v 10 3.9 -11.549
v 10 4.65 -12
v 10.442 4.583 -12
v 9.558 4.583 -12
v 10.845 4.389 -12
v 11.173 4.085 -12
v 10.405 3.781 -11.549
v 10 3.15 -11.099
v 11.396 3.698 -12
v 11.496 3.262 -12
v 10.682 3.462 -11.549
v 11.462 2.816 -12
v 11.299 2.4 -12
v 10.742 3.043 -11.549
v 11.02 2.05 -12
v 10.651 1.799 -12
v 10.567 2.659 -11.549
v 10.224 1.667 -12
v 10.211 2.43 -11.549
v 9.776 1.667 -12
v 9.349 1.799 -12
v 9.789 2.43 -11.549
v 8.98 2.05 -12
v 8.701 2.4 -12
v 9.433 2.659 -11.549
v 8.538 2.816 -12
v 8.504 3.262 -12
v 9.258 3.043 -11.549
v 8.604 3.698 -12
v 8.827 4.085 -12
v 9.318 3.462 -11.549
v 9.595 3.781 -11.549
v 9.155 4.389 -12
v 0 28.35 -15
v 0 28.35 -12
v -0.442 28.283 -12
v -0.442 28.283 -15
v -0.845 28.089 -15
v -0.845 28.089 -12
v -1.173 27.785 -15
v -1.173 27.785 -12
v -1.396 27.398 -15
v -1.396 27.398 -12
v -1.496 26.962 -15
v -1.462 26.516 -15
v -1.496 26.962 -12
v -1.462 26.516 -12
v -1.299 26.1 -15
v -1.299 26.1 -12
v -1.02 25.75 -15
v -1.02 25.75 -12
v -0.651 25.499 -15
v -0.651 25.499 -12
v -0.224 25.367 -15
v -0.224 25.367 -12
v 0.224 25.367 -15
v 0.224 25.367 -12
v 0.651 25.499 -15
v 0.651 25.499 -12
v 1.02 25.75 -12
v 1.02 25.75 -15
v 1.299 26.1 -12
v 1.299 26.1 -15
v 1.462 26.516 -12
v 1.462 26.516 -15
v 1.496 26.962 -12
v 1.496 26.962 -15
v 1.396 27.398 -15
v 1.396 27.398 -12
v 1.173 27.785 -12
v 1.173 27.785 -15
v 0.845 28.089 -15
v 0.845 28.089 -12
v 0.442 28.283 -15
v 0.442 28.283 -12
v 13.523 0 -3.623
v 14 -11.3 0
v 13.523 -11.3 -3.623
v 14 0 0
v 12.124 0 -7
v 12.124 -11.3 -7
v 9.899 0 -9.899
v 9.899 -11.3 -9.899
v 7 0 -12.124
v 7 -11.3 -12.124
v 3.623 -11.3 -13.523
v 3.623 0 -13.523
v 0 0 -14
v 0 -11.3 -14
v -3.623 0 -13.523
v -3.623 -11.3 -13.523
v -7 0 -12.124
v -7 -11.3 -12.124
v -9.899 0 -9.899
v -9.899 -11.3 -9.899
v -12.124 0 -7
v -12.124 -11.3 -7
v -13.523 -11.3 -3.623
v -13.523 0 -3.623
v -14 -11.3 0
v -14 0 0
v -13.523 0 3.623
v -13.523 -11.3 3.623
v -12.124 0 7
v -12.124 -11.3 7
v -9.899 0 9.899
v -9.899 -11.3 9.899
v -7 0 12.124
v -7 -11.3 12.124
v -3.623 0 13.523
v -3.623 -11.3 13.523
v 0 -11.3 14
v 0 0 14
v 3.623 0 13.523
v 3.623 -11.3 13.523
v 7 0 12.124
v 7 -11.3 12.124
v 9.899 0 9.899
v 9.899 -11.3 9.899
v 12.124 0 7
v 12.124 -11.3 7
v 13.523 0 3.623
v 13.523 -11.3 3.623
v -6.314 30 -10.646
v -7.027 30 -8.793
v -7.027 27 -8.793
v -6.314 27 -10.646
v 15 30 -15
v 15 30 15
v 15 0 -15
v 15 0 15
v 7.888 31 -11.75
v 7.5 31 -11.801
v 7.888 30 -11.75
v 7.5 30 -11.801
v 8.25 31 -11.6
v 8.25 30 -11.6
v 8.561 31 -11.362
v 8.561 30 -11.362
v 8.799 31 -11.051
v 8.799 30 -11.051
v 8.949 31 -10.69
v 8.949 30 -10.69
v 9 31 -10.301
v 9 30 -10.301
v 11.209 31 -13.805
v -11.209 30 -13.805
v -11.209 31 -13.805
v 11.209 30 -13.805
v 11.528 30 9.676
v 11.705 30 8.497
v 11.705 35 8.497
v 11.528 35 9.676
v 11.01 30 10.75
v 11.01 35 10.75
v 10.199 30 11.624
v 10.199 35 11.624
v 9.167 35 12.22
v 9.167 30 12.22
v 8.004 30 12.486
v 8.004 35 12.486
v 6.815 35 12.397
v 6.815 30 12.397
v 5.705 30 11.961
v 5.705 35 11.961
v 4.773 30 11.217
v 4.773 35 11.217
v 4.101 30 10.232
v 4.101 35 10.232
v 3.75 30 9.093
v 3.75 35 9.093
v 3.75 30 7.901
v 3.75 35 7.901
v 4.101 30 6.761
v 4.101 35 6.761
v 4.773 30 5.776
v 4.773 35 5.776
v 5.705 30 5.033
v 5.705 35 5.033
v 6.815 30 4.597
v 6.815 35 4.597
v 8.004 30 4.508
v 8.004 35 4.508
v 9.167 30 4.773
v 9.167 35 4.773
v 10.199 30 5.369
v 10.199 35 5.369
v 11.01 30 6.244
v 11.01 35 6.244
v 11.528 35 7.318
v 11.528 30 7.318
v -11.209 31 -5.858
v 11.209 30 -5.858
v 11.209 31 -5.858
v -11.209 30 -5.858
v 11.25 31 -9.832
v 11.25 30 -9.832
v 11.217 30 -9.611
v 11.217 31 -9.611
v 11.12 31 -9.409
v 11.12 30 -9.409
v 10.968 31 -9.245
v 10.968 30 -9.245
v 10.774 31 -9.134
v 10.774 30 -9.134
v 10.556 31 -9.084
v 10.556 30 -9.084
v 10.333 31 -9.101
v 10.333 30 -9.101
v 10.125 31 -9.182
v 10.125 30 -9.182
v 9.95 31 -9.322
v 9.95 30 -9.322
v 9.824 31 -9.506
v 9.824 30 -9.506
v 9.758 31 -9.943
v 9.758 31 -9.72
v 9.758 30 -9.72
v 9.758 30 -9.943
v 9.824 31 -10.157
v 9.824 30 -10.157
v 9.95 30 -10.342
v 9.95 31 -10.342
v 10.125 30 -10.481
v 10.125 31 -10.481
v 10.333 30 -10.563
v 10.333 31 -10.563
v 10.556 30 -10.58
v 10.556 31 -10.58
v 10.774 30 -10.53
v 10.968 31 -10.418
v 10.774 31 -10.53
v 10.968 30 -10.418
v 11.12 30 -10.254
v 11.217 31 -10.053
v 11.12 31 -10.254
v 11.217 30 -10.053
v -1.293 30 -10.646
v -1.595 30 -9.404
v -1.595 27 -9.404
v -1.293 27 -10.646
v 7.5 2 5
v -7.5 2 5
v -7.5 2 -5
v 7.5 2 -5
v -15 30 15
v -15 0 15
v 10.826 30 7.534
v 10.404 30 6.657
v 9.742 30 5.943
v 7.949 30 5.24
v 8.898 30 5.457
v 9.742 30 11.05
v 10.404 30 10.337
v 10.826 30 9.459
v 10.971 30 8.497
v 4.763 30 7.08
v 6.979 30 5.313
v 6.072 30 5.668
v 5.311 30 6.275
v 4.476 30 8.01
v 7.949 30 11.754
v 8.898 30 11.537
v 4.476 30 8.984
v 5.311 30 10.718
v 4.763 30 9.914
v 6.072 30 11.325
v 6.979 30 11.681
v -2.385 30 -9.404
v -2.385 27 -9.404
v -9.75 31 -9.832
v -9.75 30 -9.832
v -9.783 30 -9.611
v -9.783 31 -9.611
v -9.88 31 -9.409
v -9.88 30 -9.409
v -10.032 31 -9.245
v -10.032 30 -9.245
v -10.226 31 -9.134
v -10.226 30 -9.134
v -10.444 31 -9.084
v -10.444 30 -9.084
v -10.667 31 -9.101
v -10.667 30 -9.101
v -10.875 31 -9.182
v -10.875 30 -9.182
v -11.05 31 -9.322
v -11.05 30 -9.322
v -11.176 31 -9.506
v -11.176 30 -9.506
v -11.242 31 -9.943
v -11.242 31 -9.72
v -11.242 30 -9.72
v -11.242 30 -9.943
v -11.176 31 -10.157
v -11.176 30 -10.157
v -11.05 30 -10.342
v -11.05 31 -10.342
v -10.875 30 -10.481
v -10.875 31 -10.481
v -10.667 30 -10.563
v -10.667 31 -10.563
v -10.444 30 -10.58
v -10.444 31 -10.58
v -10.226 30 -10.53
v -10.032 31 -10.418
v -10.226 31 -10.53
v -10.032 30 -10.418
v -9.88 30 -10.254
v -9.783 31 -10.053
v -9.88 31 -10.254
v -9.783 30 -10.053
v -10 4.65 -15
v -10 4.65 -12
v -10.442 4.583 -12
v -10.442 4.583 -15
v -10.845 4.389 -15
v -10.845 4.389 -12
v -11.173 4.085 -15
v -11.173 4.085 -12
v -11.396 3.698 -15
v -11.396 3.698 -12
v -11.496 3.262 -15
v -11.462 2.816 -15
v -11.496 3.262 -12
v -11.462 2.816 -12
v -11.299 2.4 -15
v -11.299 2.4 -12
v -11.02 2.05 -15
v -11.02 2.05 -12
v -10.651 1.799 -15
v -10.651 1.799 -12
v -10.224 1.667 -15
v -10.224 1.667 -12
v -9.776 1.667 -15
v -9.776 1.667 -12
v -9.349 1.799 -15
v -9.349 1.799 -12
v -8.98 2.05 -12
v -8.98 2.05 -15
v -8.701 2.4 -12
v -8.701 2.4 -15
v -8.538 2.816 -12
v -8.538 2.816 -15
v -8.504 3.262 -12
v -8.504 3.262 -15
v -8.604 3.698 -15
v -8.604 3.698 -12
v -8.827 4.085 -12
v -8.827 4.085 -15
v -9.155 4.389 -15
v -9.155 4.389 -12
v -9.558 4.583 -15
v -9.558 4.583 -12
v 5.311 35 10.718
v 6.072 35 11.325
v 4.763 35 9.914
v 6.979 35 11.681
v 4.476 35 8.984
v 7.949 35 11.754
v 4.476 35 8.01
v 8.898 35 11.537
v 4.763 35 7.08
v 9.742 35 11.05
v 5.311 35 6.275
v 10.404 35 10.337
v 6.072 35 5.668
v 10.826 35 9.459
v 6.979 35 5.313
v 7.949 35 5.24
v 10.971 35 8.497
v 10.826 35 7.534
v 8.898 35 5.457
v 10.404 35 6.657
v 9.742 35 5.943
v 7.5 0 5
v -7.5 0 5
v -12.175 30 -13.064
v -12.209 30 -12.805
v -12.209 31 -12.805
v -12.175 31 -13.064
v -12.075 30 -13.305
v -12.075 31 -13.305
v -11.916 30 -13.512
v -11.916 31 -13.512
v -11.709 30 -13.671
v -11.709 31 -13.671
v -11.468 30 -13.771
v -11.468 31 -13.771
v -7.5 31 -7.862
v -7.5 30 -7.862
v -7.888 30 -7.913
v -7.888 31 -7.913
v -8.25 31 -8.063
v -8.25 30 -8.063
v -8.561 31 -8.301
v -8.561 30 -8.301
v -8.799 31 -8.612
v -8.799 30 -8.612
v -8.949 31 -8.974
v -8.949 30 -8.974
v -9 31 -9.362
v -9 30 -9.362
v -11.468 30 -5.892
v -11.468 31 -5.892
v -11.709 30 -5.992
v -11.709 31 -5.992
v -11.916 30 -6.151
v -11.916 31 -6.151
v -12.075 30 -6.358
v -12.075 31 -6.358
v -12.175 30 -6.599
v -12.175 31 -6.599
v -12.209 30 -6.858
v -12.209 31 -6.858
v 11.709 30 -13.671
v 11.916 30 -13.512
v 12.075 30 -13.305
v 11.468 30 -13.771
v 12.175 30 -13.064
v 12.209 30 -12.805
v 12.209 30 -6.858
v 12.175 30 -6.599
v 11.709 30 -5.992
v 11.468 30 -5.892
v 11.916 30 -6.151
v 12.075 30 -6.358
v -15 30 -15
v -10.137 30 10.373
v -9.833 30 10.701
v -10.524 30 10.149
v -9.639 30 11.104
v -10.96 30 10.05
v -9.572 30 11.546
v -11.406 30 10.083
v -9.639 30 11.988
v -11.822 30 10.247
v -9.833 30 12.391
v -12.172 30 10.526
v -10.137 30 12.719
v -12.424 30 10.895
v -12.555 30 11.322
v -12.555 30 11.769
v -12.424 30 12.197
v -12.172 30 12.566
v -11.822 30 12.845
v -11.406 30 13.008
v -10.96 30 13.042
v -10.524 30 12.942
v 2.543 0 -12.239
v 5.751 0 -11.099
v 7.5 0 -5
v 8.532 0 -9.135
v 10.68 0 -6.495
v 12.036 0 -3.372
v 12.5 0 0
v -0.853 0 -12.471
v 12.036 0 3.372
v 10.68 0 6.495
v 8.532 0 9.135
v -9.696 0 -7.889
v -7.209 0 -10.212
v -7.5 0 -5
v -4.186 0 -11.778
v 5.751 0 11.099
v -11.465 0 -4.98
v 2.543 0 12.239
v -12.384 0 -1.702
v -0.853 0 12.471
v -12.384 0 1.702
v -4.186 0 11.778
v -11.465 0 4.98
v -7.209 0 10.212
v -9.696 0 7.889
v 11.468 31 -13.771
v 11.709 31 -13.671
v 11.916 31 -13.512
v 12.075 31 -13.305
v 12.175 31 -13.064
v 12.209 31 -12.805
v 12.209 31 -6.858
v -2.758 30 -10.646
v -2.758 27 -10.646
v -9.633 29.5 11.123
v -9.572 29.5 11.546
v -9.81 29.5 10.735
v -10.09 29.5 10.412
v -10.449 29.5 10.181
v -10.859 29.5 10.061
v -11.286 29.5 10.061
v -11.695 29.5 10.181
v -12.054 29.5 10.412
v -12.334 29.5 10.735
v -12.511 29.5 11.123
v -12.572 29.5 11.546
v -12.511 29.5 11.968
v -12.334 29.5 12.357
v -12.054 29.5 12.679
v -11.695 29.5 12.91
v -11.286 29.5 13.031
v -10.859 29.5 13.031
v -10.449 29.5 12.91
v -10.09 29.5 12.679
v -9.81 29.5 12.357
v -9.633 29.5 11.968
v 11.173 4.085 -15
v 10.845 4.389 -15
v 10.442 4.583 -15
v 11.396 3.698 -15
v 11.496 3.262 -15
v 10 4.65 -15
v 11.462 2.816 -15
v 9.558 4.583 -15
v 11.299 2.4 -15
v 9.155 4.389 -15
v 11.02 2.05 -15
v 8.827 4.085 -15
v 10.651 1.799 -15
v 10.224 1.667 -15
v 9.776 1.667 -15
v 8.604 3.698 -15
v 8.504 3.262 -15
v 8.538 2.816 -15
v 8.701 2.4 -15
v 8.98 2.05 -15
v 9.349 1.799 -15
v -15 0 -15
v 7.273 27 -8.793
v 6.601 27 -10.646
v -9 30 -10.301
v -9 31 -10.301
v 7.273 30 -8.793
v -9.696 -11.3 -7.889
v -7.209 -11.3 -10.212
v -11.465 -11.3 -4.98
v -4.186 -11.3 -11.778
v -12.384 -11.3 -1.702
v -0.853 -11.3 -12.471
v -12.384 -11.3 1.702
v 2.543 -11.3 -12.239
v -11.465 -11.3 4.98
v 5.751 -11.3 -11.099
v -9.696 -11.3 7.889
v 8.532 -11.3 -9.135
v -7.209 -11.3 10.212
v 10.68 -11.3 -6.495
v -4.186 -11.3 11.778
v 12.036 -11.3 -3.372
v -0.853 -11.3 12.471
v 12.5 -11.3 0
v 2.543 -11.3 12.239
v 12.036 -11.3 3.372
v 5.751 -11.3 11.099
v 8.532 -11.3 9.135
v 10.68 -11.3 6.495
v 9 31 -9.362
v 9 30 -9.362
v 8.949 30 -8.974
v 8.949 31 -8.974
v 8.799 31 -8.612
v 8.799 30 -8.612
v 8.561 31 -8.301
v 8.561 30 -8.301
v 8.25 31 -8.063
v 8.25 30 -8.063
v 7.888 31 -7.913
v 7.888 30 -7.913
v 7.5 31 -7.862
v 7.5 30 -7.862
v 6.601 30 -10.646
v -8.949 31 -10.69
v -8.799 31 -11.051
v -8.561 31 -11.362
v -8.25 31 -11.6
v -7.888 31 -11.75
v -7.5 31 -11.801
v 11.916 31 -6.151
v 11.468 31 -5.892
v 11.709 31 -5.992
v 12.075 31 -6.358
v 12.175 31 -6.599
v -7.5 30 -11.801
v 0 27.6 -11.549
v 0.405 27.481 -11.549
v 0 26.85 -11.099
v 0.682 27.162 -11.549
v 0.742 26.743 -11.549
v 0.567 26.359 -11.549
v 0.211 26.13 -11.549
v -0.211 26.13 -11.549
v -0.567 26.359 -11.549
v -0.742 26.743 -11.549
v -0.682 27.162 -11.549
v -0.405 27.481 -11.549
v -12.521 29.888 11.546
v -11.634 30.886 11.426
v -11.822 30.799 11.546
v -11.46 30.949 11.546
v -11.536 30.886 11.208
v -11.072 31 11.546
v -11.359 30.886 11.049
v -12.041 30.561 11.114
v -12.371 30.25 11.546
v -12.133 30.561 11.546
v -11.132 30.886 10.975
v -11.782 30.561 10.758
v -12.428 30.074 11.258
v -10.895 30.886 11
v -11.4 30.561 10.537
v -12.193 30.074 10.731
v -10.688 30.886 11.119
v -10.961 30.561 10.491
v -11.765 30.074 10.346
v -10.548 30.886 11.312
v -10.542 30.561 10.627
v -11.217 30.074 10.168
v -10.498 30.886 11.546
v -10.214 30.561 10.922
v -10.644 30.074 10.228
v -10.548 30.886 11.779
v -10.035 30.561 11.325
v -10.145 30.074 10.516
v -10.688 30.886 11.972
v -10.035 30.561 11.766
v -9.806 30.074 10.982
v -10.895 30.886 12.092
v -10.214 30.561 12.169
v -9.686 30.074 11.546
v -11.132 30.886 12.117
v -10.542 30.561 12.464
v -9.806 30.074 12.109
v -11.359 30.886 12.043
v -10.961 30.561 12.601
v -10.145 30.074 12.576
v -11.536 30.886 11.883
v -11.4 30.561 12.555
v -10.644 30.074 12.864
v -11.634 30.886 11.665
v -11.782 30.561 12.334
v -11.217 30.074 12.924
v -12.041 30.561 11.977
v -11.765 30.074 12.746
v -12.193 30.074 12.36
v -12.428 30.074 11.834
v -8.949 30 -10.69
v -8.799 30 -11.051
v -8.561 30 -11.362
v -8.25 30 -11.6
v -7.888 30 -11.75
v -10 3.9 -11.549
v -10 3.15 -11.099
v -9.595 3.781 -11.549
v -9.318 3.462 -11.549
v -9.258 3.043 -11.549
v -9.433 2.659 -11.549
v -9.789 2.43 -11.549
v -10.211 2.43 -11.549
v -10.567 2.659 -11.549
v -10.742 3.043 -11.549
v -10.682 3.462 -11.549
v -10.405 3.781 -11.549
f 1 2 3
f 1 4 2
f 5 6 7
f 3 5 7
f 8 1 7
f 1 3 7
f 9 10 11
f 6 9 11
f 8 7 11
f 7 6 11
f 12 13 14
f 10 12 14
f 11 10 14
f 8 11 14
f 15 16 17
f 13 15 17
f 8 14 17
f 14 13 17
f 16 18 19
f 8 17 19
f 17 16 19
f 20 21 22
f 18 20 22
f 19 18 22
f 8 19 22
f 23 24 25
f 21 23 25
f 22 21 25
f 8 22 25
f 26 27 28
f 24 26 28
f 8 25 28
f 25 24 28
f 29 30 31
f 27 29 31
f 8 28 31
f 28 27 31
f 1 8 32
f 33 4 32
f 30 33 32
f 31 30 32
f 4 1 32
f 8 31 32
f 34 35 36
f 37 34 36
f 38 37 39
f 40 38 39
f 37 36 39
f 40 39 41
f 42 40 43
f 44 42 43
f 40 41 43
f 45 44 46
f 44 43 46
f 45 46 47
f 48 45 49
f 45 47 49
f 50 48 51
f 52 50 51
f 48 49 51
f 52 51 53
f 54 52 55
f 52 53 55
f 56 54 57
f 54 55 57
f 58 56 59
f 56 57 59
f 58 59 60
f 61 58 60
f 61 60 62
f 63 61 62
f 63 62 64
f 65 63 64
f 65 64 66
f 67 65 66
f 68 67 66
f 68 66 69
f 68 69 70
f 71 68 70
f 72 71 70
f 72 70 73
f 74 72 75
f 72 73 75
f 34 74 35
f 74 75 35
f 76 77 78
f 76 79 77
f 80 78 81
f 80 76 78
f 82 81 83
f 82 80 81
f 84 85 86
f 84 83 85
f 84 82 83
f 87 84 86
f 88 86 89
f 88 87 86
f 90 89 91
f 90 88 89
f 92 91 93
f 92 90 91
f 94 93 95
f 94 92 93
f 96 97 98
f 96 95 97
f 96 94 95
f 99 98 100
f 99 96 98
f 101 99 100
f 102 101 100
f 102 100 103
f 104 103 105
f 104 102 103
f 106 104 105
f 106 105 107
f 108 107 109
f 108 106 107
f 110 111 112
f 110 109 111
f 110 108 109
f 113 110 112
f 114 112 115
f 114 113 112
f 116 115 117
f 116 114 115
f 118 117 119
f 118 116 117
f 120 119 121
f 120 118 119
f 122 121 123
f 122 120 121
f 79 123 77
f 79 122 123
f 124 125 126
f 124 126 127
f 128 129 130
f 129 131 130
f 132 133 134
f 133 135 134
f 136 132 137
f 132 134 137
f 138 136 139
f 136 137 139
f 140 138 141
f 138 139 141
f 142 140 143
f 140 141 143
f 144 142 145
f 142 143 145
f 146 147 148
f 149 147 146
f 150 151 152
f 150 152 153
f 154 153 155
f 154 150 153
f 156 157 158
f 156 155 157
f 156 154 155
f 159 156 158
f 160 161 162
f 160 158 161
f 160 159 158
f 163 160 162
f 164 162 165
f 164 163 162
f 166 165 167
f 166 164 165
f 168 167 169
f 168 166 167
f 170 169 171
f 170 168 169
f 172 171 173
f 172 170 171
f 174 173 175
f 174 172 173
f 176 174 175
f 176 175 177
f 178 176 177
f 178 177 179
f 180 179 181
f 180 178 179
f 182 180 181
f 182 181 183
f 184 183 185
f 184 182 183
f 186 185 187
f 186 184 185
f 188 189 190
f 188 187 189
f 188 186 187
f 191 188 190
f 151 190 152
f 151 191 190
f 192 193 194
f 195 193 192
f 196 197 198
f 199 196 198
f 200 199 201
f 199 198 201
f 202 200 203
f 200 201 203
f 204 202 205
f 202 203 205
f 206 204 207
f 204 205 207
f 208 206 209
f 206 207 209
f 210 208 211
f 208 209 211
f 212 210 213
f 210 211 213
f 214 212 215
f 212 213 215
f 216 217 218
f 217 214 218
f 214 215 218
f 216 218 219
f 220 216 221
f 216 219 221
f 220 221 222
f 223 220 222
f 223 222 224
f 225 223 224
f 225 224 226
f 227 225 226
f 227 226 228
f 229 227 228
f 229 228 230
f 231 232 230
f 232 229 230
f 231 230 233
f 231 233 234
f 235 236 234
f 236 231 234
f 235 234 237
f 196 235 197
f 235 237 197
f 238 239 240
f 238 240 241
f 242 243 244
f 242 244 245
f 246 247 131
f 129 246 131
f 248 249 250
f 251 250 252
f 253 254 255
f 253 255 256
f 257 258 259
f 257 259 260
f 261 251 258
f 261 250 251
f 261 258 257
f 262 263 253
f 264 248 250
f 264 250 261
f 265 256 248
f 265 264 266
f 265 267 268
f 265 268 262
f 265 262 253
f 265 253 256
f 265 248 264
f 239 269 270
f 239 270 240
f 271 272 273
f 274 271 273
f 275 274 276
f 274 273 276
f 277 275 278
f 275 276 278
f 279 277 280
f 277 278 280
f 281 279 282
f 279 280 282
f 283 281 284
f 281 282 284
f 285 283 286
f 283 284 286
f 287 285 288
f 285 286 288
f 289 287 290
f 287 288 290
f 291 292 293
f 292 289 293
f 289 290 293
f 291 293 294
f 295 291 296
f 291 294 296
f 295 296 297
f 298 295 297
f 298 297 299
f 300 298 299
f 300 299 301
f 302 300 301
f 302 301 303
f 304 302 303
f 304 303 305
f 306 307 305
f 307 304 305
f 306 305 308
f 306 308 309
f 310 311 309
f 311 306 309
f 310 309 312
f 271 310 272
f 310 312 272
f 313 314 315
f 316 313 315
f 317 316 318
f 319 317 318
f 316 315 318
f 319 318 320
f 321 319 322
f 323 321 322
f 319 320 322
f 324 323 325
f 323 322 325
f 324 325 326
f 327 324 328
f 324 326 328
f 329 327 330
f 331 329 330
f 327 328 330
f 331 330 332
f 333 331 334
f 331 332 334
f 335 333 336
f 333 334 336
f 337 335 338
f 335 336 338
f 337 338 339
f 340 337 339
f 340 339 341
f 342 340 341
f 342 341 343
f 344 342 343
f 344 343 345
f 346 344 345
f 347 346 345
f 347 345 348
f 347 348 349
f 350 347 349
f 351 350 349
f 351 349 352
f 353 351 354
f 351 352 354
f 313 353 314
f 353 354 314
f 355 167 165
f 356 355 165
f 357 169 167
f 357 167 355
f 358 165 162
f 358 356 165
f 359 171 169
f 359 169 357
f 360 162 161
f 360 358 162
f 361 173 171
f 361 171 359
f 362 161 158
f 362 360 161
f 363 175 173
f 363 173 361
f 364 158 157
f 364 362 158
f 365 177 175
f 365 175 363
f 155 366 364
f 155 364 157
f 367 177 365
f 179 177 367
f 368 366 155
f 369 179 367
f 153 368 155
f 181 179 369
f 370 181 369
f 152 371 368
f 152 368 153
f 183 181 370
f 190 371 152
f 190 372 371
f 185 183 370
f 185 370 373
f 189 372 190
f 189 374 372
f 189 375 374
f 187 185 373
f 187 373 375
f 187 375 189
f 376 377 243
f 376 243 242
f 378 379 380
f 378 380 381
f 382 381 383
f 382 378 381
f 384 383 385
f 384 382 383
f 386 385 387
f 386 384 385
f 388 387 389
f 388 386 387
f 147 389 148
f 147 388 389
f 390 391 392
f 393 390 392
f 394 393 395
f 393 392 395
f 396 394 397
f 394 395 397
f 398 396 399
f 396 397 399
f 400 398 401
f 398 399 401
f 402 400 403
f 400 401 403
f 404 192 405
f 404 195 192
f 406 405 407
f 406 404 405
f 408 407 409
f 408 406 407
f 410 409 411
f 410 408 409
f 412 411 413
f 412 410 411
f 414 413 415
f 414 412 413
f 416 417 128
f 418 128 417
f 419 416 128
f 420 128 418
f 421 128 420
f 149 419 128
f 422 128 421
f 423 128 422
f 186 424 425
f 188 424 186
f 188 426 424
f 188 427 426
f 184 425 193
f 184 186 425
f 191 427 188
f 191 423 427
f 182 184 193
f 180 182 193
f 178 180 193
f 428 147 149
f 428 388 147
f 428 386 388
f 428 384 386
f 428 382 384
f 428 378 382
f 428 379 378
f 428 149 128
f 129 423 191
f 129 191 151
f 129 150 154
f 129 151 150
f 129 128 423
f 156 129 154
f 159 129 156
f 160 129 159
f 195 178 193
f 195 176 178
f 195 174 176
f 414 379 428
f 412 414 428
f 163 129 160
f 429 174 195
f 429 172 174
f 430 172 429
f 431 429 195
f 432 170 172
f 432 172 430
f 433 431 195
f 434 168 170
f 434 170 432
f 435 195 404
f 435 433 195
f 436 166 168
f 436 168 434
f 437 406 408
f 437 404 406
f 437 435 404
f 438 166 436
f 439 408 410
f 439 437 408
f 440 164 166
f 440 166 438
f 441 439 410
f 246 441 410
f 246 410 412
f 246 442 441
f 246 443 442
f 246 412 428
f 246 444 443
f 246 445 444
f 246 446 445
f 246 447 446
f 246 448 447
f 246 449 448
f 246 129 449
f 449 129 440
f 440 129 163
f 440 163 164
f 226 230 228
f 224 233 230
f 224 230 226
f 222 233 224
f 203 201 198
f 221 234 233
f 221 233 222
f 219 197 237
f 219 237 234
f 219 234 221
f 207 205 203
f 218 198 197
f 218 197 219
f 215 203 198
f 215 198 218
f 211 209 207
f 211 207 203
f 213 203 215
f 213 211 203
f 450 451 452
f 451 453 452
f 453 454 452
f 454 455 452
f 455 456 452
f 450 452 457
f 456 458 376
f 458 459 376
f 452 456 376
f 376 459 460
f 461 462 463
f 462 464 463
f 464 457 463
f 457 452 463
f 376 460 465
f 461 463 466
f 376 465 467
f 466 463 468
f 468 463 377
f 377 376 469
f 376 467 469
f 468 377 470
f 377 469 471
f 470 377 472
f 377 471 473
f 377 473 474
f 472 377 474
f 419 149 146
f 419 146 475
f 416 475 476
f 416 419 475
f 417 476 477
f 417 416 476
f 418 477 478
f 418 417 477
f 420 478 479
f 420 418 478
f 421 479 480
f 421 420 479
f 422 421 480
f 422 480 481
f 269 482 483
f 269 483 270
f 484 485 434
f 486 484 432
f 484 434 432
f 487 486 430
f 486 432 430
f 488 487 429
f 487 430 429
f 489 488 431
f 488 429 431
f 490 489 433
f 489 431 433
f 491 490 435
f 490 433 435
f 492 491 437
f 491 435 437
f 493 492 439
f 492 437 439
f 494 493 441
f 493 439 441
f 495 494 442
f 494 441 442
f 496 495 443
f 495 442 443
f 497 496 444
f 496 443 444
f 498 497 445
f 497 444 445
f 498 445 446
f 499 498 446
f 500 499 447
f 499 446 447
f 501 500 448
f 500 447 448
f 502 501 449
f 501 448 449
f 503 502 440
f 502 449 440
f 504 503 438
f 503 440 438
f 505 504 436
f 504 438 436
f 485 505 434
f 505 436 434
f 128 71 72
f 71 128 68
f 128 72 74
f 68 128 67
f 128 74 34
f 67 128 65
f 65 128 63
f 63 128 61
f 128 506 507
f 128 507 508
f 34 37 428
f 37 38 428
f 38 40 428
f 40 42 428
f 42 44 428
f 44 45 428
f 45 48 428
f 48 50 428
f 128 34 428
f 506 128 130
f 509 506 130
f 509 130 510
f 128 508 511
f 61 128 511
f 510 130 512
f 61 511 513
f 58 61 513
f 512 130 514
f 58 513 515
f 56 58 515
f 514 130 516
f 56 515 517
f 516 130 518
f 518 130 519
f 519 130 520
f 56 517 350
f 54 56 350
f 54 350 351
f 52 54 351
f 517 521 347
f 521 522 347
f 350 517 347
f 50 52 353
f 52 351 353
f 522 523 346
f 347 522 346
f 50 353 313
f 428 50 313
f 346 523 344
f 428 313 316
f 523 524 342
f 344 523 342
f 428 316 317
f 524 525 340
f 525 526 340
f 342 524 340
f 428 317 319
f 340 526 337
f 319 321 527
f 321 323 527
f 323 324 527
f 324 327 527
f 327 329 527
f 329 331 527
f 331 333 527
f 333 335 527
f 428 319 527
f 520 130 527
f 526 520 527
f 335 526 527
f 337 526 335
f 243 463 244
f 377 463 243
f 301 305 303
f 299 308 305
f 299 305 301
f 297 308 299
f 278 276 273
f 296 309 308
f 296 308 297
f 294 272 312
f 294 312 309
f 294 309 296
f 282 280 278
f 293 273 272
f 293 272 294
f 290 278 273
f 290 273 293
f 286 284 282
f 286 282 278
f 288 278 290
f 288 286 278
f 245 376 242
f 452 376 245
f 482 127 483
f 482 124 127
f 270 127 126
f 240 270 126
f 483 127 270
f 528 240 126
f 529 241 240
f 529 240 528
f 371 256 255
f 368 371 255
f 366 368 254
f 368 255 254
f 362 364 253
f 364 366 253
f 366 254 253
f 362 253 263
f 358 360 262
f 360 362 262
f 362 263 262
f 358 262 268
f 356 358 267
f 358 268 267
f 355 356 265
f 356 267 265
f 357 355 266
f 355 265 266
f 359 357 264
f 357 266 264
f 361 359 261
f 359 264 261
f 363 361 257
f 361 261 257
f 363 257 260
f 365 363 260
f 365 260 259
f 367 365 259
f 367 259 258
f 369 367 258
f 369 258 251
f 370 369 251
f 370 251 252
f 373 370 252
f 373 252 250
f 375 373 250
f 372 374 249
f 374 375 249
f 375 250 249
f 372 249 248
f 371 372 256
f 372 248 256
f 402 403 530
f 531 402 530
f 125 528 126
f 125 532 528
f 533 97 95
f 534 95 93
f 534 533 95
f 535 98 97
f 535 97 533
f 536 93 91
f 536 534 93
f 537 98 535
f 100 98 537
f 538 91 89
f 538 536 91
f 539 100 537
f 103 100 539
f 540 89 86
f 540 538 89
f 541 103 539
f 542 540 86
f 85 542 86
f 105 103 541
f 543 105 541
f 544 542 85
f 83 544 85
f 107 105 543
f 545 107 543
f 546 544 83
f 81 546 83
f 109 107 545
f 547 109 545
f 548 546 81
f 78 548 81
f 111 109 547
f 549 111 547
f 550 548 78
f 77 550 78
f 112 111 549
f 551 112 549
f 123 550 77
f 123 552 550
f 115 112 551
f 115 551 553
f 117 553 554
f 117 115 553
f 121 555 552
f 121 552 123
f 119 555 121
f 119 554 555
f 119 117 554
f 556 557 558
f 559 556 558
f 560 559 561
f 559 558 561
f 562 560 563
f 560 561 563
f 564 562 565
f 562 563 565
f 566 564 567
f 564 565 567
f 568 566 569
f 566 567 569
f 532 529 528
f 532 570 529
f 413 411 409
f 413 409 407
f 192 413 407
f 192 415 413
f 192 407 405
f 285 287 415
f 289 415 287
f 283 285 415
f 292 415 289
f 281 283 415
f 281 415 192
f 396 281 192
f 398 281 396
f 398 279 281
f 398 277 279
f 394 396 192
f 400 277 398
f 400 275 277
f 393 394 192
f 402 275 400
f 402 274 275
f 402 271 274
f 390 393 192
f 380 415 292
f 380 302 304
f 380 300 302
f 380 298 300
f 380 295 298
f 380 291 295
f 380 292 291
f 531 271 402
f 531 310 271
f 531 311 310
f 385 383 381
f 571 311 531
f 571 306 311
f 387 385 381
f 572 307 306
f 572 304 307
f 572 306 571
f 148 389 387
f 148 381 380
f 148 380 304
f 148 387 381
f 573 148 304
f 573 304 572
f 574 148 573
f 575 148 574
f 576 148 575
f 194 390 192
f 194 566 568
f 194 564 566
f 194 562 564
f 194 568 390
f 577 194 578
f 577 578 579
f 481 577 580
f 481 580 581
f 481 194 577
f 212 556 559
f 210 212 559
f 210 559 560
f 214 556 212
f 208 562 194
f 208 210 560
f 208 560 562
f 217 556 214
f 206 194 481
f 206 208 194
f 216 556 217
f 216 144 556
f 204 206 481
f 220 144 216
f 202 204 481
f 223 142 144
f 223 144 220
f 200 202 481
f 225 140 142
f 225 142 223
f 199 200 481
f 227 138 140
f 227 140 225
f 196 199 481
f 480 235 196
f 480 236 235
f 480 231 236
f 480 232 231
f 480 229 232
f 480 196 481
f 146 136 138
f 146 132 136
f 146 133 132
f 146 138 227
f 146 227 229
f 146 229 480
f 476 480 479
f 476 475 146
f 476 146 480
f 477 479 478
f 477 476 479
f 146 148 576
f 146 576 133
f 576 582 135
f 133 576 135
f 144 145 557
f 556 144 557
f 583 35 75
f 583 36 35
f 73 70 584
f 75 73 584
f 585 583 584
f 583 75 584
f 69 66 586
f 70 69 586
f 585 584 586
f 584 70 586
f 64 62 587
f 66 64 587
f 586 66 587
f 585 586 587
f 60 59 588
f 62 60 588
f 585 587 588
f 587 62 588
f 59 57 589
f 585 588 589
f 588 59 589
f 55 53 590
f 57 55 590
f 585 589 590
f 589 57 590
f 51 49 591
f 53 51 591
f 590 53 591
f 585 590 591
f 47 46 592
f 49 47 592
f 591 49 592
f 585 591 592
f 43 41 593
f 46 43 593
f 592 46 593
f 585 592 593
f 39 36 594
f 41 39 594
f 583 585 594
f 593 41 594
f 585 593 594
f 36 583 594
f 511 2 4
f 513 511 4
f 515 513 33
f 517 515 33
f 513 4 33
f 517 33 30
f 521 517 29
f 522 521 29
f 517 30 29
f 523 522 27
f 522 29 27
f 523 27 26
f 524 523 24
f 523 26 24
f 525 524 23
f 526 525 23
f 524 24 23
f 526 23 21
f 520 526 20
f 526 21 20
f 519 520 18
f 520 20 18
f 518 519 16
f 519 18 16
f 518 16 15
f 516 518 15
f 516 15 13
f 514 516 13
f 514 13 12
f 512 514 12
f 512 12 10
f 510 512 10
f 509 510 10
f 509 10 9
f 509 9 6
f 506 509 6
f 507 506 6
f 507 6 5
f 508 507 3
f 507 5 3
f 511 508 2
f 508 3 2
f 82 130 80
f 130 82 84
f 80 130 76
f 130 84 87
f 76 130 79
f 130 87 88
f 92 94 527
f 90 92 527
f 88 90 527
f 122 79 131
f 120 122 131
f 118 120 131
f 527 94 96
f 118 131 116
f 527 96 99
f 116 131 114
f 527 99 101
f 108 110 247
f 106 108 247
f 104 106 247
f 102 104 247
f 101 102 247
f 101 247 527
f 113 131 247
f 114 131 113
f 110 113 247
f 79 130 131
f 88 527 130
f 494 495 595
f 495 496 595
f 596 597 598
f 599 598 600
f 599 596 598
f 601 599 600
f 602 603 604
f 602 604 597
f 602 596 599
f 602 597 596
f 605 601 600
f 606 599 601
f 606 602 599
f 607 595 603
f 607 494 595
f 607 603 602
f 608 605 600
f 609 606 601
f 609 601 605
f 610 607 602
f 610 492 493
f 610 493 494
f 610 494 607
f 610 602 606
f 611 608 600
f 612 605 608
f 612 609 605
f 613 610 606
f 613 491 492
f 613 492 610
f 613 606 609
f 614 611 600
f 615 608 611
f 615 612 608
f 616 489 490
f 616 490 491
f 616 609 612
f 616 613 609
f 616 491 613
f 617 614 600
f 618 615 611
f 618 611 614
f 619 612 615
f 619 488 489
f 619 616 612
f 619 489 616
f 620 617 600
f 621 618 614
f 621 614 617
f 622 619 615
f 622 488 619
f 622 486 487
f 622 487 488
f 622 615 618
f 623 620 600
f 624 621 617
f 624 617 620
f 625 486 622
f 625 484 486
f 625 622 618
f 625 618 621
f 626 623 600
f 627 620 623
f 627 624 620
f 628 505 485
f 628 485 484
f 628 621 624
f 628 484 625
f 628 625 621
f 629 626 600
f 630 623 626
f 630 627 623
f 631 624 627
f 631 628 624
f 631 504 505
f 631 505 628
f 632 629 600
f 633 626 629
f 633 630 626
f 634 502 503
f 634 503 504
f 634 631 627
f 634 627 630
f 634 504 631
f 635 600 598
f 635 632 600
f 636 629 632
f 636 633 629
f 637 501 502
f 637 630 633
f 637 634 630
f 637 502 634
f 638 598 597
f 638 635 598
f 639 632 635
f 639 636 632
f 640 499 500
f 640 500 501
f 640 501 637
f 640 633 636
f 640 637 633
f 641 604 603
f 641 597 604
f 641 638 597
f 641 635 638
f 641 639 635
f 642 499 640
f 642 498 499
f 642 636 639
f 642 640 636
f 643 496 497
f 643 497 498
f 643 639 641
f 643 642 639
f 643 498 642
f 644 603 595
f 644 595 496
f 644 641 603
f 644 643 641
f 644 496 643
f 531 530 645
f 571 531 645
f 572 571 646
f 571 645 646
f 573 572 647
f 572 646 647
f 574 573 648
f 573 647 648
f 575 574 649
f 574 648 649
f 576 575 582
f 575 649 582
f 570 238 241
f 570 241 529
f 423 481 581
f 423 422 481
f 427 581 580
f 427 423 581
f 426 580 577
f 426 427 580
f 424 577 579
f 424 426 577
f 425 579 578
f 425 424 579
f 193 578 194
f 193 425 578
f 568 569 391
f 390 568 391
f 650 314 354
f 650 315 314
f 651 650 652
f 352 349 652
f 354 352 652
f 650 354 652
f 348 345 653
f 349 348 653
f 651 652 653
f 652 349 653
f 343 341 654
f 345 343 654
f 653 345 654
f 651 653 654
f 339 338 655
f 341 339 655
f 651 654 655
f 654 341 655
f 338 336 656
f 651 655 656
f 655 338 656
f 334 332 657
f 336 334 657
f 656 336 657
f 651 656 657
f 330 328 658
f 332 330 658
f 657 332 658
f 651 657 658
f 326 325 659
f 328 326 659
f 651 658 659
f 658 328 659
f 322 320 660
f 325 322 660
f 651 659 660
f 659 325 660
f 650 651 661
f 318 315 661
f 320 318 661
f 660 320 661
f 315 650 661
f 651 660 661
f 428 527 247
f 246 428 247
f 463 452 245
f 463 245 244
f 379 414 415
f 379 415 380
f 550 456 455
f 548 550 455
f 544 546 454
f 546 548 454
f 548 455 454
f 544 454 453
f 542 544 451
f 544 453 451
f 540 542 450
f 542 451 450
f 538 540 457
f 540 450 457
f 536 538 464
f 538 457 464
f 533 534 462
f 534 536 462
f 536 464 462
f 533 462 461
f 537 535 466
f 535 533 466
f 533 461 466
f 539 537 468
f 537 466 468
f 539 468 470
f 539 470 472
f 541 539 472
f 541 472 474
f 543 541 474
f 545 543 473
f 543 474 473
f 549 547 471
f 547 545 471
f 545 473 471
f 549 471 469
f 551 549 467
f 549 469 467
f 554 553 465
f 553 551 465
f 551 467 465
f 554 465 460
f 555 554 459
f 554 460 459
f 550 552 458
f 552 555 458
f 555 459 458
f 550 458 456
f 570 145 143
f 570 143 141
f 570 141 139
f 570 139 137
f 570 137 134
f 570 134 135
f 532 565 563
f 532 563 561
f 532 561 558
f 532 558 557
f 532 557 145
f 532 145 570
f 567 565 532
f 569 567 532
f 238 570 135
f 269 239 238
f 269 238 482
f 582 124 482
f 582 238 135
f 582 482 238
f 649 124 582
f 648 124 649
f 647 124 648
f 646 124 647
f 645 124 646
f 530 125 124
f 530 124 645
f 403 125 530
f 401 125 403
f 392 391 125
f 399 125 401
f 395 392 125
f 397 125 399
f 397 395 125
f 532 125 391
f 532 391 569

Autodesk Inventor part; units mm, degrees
ref_plane "YZ Plane" through (0, 0, 0) normal (1, 0, 0) x (0, 1, 0)
ref_plane "XZ Plane" through (0, 0, 0) normal (0, 1, 0) x (-1, 0, 0)
sketch "Sketch1" plane through (0, 0, 0) normal (0, 1, 0) x (-1, 0, 0)
  line L0 (-15, -15) -> (15, -15)
  line L1 (15, -15) -> (15, 15)
  line L2 (15, 15) -> (-15, 15)
  line L3 (-15, 15) -> (-15, -15)
  line L4 (-15, -15) -> (15, 15) construction
  line L5 (15, -15) -> (-15, 15) construction
  point P0 (0, 0)
  dimension "d0" = 30
  dimension "d1" = 30
extrude "Cube" add sketch "Sketch1" along normal blind 30
sketch "Sketch2" plane through (0, 0, 0) normal (0, -1, 0) x (1, 0, 0)
  circle A0 centre (0, 0) radius 14
  circle A1 centre (0, 0) radius 12.5
  dimension "d4" = 28
  dimension "d7" = 1.5
extrude "Lens Mount" add sketch "Sketch2" along normal blind 11.3
sketch "Sketch3" plane through (0, 0, 0) normal (0, -1, 0) x (1, 0, 0)
  line L0 (7.5, -5) -> (-7.5, -5)
  line L1 (-7.5, -5) -> (-7.5, 5)
  line L2 (-7.5, 5) -> (7.5, 5)
  line L3 (7.5, 5) -> (7.5, -5)
  line L4 (7.5, -5) -> (-7.5, 5) construction
  line L5 (-7.5, -5) -> (7.5, 5) construction
  point P0 (0, 0)
  dimension "d8" = 15
  dimension "d9" = 10
extrude "\"Sensor\"" cut sketch "Sketch3" against normal blind 2
sketch "Sketch4" plane through (15, 0, -15) normal (0, 0, -1) x (-1, 0, 0)
  line L0 (15, 0) -> (15, 30.669)
  line L1 (0, 30) -> (30, 30) projected
  point P0 (15, 26.85)
  point P1 (5, 3.15)
  point P2 (25, 3.15)
  dimension "d12" = 23.7
  dimension "d13" = 20
  dimension "d14" = 3.15
hole "Mounting Holes" at (0, 26.85, -15) at (10, 3.15, -15) at (-10, 3.15, -15) direction (0, 0, 1) diameter 3 depth 3 tip angle 118
sketch "Sketch5" plane through (0, 30, 0) normal (0, 1, 0) x (1, 0, 0)
  circle A0 centre (7.7053, -8.4968) radius 4
  circle A1 centre (7.7053, -8.4968) radius 3.2659
  point P0 (0, 0)
  dimension "d22" = 8
extrude "Cable Port" add sketch "Sketch5" along normal blind 5
sketch "Sketch6" plane through (0, 30, 0) normal (0, 1, 0) x (1, 0, 0)
  line L0 (7.2728, 8.793) -> (-7.0273, 8.793)
  line L1 (-7.0273, 8.793) -> (-6.3141, 10.6463)
  line L2 (-6.3141, 10.6463) -> (-2.7583, 10.6463)
  line L3 (-2.7583, 10.6463) -> (-2.3847, 9.4043)
  line L4 (-2.3847, 9.4043) -> (-1.5951, 9.4043)
  line L5 (-1.5951, 9.4043) -> (-1.2927, 10.6463)
  line L6 (-1.2927, 10.6463) -> (6.6007, 10.6463)
  line L7 (6.6007, 10.6463) -> (7.2728, 8.793)
  point P0 (0, 0)
extrude "HDMI profile" cut sketch "Sketch6" against normal blind 3
sketch "Sketch8" plane through (0, 30, 0) normal (0, 1, 0) x (1, 0, 0)
  line L0 (-7.5, 11.8014) -> (7.5, 11.8014)
  line L1 (9, 10.3014) -> (9, 9.362)
  line L2 (7.5, 7.862) -> (-7.5, 7.862)
  line L3 (-9, 9.362) -> (-9, 10.3014)
  line L4 (-9, 11.8014) -> (9, 7.862) construction
  line L5 (9, 11.8014) -> (-9, 7.862) construction
  arc A0 (7.5, 7.862) -> (9, 9.362) centre (7.5, 9.362) ccw
  arc A1 (-9, 9.362) -> (-7.5, 7.862) centre (-7.5, 9.362) ccw
  arc A2 (-7.5, 11.8014) -> (-9, 10.3014) centre (-7.5, 10.3014) ccw
  arc A3 (9, 10.3014) -> (7.5, 11.8014) centre (7.5, 10.3014) ccw
  line L6 (-11.209, 13.8051) -> (11.209, 13.8051)
  line L7 (12.209, 12.8051) -> (12.209, 6.8583)
  line L8 (11.209, 5.8583) -> (-11.209, 5.8583)
  line L9 (-12.209, 6.8583) -> (-12.209, 12.8051)
  line L10 (-12.209, 13.8051) -> (12.209, 5.8583) construction
  line L11 (12.209, 13.8051) -> (-12.209, 5.8583) construction
  arc A4 (11.209, 5.8583) -> (12.209, 6.8583) centre (11.209, 6.8583) ccw
  arc A5 (-12.209, 6.8583) -> (-11.209, 5.8583) centre (-11.209, 6.8583) ccw
  arc A6 (-11.209, 13.8051) -> (-12.209, 12.8051) centre (-11.209, 12.8051) ccw
  arc A7 (12.209, 12.8051) -> (11.209, 13.8051) centre (11.209, 12.8051) ccw
  circle A8 centre (10.5, 9.8317) radius 0.75
  circle A9 centre (-10.5, 9.8317) radius 0.75
  point P0 (0, 0)
  point P1 (0, 9.8317)
  dimension "d27" = 1.5
  dimension "d28" = 1
  dimension "d31" = 24.4179
  dimension "d32" = 18
  dimension "d33" = 1.5
  dimension "d34" = 10.5
  dimension "d35" = 1.5
  dimension "d36" = 10.5
extrude "Cable Mount" add sketch "Sketch8" along normal blind 1
sketch "Sketch9" plane through (0, 30, 0) normal (0, 1, 0) x (1, 0, 0)
  circle A0 centre (-11.0721, -11.5458) radius 1.5
  point P0 (0, 0)
  dimension "d37" = 3
extrude "Extrusion7" cut sketch "Sketch9" against normal blind 0.5
ref_plane "Work Plane1" through (-11.0721, 29.5, 11.5458) normal (0, 0, 1) x (0, -1, 0)
sketch "Sketch10" plane through (-11.0721, 29.5, 11.5458) normal (0, 0, 1) x (0, -1, 0)
  line L0 (0, -1.5) -> (0, 1.5) projected
  line L1 (0, -1.5) -> (0, 1.5) projected
  line L2 (-0.5, -1.5) -> (-0.5, 1.5) projected
  line L3 (0, -1.5) -> (0, 1.5) projected
  line L4 (-1.5, 0) -> (0, 0)
  arc A0 (-1.5, 0) -> (0, -1.5) centre (0, 0) ccw
  line L5 (-14.76, 0) -> (50.06, 0) projected
  point P0 (29.5, 11.0721)
  point P1 (0, 0)
revolve "Revolution1" add sketch "Sketch10" angle 360 about axis through (-11.0721, 29.5, 11.5458) along (0, -1, 0)
properties part number "OpticalCamera"
